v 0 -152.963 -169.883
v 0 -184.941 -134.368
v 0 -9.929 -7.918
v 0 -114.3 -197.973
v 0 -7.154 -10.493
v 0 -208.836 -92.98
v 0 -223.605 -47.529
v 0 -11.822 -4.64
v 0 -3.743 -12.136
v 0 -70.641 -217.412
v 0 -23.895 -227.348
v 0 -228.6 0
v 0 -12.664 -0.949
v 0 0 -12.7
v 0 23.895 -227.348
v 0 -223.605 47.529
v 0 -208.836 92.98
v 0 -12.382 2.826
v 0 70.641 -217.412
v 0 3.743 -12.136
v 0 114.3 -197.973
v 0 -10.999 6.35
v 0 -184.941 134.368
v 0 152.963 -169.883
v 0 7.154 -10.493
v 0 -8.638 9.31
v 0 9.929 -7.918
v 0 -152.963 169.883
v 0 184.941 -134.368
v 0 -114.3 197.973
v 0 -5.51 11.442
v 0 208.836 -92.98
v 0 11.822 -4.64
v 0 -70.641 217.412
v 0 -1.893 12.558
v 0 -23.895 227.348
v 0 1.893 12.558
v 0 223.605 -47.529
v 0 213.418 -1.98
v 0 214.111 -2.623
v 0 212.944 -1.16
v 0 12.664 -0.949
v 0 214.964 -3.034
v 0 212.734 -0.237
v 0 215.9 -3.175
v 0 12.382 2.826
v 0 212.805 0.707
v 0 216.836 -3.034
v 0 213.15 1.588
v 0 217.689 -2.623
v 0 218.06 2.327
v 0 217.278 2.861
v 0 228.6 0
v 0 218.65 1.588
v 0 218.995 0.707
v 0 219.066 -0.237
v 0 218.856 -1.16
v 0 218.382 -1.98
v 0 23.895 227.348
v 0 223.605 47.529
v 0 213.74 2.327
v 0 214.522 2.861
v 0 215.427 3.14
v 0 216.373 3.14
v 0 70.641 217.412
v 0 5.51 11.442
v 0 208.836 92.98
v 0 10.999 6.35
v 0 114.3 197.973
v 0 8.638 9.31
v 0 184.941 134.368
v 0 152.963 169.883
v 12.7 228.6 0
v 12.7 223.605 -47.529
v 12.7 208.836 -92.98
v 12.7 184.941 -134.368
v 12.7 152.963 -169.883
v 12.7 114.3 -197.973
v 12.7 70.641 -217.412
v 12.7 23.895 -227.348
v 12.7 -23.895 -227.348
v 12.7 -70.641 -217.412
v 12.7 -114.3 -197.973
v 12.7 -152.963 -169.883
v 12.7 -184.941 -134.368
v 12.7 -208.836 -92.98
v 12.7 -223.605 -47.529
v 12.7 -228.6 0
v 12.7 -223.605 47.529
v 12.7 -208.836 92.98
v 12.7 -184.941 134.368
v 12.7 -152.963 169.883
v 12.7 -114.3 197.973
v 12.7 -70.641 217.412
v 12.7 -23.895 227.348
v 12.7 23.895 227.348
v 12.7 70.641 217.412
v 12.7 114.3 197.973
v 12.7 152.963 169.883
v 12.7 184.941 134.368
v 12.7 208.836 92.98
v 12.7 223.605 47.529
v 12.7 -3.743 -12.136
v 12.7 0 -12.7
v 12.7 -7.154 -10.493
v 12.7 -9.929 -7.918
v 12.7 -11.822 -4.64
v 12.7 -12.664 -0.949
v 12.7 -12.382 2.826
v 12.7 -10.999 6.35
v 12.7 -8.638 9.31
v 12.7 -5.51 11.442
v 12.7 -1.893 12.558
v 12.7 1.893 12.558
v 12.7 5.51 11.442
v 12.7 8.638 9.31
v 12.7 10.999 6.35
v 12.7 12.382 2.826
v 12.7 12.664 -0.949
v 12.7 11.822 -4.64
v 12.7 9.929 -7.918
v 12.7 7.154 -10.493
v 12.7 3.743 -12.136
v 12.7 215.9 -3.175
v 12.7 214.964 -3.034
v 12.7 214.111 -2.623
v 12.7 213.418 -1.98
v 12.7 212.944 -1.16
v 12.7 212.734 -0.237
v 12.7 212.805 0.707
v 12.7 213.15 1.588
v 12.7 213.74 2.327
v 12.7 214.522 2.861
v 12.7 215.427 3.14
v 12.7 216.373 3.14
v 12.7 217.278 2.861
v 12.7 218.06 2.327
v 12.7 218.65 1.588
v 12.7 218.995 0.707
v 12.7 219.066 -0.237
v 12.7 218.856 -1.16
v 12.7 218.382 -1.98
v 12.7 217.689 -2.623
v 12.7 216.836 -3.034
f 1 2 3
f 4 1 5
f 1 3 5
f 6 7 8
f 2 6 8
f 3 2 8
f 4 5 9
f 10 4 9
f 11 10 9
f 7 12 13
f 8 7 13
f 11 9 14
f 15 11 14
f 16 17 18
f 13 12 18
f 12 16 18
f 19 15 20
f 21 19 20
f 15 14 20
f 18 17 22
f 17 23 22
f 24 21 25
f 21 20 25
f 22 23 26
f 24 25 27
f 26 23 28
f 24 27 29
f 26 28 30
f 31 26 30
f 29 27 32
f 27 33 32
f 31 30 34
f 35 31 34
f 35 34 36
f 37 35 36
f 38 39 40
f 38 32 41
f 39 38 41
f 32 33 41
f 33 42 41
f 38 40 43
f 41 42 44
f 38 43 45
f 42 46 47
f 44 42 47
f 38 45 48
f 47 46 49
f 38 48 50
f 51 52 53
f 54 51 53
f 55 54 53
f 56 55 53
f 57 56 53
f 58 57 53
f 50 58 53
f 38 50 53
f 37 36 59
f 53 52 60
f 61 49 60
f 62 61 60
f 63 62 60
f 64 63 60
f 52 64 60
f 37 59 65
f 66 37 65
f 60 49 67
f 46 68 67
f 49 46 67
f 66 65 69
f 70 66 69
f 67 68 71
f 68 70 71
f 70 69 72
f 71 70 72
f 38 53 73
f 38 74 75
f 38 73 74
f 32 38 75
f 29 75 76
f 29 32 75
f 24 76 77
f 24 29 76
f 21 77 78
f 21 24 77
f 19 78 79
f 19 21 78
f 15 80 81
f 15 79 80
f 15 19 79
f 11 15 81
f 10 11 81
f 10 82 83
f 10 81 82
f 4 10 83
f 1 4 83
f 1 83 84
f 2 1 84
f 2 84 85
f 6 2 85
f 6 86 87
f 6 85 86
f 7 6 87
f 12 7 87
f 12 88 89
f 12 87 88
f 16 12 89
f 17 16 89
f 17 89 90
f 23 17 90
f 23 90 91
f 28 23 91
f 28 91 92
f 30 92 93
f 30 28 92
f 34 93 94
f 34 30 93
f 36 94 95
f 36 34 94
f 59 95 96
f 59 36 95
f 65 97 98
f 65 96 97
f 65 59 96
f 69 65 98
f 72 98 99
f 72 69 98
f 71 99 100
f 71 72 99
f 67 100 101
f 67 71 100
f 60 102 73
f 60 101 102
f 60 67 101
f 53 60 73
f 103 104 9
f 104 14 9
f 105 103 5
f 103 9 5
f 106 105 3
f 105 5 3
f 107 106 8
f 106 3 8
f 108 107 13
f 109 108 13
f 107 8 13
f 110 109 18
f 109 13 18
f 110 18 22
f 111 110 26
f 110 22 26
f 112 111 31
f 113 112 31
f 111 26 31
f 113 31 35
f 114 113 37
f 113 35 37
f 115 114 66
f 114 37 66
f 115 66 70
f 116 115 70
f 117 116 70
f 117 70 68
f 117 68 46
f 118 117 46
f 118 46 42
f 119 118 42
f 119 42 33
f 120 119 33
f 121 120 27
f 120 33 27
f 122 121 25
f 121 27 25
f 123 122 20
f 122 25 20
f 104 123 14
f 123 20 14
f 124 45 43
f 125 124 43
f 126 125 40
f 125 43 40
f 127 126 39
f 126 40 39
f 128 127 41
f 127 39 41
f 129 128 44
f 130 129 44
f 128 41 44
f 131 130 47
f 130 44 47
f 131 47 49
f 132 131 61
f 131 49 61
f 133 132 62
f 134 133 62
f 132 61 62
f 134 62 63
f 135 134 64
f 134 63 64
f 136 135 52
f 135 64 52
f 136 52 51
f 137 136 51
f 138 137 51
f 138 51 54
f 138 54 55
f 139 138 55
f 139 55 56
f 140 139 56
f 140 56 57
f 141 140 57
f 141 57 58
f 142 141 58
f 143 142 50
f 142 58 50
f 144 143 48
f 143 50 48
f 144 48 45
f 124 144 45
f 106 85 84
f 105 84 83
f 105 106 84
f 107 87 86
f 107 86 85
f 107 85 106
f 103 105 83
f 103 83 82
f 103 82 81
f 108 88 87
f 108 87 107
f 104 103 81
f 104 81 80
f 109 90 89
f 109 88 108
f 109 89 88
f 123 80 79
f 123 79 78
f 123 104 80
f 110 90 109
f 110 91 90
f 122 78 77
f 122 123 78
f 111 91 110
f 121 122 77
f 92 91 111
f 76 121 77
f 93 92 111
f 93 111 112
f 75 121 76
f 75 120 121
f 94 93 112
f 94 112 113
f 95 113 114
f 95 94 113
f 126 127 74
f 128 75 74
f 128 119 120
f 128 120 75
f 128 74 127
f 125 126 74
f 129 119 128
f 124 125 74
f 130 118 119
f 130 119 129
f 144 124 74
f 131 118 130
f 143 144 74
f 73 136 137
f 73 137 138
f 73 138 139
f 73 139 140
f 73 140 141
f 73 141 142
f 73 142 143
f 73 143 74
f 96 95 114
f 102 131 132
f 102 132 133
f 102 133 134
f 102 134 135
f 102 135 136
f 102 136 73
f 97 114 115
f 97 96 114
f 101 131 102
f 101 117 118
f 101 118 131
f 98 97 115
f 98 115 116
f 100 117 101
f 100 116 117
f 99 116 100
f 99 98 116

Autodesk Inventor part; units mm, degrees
ref_plane "YZ Plane" through (0, 0, 0) normal (1, 0, 0) x (0, 1, 0)
ref_plane "XZ Plane" through (0, 0, 0) normal (0, 1, 0) x (-1, 0, 0)
ref_plane "XY Plane" through (0, 0, 0) normal (0, 0, 1) x (1, 0, 0)
sketch "Sketch1" plane through (0, 0, 0) normal (1, 0, 0) x (0, 1, 0)
  circle A0 centre (0, 0) radius 228.6
  dimension "d0" = 457.2
extrude "Extrusion1" add sketch "Sketch1" along normal blind 12.7
hole "Hole1" at (12.7, 0, 0) direction (-1, 0, 0) diameter 25.4 end through all
sketch "Sketch3" plane through (12.7, 0, 0) normal (1, 0, 0) x (0, 0, -1)
  circle A0 centre (0, 0) radius 12.7 projected
  point P0 (0, 215.9)
  dimension "d23" = 215.9
hole "Hole2" at (12.7, 215.9, 0) direction (-1, 0, 0) diameter 6.35 end through all
properties part number "rotator"
